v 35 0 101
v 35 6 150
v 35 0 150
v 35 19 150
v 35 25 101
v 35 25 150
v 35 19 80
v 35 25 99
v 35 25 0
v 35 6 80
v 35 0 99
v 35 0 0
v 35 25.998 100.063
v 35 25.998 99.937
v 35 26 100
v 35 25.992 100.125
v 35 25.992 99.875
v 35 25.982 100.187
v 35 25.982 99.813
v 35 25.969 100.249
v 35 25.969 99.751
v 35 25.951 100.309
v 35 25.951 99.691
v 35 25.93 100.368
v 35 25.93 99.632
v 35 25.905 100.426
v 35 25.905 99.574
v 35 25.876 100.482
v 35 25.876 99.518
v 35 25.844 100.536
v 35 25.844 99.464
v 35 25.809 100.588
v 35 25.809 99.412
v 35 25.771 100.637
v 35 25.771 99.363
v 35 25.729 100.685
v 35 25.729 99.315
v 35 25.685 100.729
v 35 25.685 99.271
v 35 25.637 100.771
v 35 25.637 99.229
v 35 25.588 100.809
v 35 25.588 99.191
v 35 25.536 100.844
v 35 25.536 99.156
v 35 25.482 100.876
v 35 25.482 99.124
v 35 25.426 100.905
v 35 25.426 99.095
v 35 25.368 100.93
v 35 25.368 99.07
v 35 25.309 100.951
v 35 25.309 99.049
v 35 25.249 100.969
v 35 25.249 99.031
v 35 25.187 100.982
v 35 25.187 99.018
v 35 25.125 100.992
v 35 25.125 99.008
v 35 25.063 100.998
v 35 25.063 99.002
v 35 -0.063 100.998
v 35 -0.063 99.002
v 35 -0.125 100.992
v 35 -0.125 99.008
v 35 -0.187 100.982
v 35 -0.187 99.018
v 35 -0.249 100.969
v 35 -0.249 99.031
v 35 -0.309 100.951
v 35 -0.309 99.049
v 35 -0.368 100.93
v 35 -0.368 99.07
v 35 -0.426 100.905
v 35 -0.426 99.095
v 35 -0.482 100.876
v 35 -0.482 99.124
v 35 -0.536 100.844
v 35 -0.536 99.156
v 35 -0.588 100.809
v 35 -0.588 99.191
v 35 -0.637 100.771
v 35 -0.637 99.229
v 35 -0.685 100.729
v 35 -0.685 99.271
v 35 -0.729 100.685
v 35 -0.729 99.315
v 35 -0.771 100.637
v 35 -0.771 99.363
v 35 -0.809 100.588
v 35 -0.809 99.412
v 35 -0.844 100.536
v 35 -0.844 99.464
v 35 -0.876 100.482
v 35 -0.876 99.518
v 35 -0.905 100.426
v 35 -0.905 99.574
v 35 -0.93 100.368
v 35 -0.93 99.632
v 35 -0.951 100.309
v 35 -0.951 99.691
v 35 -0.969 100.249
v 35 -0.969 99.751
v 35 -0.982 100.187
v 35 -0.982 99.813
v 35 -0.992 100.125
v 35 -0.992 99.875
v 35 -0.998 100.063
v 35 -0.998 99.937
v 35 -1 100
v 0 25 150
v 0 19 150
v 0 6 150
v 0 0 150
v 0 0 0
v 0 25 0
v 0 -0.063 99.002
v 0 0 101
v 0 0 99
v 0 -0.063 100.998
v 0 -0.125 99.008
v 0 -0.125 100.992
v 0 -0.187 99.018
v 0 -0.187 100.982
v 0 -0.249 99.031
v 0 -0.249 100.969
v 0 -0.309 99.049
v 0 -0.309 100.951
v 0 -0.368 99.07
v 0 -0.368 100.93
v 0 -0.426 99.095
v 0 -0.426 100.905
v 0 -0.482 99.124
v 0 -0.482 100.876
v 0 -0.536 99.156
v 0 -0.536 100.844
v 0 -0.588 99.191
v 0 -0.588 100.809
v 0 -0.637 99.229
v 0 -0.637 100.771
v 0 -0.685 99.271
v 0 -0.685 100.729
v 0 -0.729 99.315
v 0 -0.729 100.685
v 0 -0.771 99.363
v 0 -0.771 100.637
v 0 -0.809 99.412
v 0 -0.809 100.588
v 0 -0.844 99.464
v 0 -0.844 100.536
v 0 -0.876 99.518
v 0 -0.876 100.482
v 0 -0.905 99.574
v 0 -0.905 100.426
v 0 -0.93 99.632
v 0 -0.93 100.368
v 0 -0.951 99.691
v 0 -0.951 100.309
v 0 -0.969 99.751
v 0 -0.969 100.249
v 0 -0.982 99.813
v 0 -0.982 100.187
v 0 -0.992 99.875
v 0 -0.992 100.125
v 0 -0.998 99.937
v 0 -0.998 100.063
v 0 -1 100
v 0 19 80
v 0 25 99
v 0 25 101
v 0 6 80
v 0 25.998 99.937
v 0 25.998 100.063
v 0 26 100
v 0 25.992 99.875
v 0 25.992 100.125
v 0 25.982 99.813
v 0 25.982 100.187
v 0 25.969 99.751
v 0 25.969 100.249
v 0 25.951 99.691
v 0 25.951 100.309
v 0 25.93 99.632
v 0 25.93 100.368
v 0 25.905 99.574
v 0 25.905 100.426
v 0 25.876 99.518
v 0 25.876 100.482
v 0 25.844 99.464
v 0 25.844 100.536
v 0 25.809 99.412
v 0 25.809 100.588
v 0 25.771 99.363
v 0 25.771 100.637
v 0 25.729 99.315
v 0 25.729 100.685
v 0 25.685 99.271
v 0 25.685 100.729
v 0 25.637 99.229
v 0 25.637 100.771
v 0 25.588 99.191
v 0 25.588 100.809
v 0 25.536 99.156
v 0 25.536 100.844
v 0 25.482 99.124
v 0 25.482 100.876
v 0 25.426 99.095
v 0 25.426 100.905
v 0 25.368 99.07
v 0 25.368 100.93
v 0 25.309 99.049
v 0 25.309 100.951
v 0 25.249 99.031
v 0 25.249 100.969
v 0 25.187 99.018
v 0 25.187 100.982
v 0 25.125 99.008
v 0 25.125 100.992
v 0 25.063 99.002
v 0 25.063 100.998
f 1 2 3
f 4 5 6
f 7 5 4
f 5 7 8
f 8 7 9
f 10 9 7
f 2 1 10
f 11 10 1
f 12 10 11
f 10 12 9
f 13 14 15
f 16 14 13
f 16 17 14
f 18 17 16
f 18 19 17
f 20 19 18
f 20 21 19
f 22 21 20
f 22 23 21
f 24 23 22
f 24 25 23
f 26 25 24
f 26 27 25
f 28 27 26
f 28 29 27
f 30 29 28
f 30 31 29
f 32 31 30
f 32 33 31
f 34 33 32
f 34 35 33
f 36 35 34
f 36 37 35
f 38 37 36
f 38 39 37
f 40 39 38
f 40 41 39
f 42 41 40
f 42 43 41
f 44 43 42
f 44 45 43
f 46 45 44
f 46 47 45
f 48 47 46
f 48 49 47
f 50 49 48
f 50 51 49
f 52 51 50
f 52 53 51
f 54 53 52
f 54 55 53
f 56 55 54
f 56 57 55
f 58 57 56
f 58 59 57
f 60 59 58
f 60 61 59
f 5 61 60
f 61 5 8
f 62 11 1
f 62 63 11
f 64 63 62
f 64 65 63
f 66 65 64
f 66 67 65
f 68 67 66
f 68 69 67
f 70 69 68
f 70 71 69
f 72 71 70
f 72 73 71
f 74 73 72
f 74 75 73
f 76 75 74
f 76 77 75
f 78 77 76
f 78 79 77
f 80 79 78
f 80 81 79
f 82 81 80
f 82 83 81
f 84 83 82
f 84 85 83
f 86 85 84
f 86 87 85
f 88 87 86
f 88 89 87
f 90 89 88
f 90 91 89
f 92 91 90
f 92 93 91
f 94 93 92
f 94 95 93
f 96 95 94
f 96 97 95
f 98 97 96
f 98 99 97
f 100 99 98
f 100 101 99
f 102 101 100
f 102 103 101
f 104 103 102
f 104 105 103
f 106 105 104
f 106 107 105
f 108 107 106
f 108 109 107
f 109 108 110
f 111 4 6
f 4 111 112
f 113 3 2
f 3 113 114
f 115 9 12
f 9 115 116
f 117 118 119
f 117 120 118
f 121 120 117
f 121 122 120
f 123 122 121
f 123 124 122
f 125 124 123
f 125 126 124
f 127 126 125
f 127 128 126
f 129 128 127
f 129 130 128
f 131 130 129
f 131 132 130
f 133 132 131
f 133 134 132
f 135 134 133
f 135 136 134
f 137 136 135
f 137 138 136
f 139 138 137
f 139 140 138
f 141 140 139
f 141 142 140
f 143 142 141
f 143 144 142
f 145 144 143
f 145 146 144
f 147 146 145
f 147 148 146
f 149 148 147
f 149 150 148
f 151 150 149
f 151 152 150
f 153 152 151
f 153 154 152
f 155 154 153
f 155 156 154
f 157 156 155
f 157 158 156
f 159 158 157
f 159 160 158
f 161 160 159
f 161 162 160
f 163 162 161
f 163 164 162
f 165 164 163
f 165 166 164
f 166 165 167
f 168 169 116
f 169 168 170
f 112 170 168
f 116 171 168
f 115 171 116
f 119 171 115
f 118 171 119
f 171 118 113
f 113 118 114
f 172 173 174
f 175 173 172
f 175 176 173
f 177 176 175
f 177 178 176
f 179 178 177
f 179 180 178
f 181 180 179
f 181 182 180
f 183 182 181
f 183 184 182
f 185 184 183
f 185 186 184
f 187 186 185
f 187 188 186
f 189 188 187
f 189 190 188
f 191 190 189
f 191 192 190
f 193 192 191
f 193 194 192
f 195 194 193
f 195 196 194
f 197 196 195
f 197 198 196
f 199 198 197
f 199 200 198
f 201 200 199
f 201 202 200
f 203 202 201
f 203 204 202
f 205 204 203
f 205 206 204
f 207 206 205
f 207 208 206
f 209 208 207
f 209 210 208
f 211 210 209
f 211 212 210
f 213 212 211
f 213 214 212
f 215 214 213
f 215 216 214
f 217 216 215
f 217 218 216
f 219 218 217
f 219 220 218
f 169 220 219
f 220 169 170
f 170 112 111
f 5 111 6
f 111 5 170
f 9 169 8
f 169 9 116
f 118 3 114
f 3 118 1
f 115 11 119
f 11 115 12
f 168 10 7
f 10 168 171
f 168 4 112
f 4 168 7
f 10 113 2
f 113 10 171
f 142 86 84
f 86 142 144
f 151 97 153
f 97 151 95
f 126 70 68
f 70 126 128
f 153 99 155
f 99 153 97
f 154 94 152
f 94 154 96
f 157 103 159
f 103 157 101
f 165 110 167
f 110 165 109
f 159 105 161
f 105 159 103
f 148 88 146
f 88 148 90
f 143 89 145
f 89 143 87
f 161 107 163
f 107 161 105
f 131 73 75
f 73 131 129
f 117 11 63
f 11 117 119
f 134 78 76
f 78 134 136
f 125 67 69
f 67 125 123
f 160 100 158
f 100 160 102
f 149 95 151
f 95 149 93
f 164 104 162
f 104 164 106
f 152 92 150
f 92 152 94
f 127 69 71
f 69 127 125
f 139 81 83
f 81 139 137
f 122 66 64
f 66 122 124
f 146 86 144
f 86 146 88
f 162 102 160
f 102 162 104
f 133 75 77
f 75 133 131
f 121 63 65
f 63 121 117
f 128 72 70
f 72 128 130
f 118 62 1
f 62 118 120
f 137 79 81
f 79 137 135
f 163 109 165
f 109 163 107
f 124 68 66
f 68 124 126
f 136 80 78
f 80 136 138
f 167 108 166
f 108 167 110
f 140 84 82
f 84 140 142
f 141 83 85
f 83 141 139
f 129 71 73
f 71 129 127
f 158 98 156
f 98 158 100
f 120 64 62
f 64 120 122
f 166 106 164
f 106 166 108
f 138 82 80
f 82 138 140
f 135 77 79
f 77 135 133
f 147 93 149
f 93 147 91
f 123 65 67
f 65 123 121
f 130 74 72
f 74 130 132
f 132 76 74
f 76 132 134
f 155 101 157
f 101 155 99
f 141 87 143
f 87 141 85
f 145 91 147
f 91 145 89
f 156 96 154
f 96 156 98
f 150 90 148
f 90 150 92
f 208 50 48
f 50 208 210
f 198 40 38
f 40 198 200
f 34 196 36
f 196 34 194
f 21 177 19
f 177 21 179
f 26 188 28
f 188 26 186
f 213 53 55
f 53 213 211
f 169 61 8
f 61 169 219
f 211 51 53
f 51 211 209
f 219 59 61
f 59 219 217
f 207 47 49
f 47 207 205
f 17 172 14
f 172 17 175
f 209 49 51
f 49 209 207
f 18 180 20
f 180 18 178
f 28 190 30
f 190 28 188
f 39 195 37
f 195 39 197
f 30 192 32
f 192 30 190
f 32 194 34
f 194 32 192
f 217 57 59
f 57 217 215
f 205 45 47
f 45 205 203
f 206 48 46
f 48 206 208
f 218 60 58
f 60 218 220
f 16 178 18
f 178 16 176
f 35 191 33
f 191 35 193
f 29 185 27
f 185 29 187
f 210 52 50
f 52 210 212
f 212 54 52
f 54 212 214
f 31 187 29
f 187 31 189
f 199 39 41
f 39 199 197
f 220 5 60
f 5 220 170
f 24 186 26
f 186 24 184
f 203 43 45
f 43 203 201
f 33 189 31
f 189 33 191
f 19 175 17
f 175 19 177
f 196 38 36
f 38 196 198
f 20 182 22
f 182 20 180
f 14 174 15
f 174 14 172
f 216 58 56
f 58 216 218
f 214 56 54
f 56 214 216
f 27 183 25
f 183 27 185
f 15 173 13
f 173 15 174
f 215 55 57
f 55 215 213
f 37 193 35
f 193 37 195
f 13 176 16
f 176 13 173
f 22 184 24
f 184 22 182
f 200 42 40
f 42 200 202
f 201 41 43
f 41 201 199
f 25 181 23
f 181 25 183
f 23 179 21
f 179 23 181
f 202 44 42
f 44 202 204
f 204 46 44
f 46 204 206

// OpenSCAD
body_width = 35;
body_length = 25;
body_height = 150;

cutout_width = 35;
cutout_length = 13;
cutout_height = 70;

module bump(w) {
  rotate([0, 90, 0])
    cylinder(h=w, r=1, $fn=100);
}

module cutout(w, l, h) {
  cube([w, l, h]);
}

module body(w, l, h) {
  cube([w, l, h]);
}

module tool(bw, bl, bh, cw, cl, ch) {
  union() {
    difference() {
      body(bw, bl, bh);

      translate([-1, (bl - cl)/2, bh - ch])
	cutout(cw + 2, cl, ch + 2);
    }

    translate([0, 0, bh - 50])
      bump(bw);

    translate([0, bl, bh - 50])
      bump(bw);
  }
}

tool(body_width, body_length, body_height,
     cutout_width, cutout_length, cutout_height);
